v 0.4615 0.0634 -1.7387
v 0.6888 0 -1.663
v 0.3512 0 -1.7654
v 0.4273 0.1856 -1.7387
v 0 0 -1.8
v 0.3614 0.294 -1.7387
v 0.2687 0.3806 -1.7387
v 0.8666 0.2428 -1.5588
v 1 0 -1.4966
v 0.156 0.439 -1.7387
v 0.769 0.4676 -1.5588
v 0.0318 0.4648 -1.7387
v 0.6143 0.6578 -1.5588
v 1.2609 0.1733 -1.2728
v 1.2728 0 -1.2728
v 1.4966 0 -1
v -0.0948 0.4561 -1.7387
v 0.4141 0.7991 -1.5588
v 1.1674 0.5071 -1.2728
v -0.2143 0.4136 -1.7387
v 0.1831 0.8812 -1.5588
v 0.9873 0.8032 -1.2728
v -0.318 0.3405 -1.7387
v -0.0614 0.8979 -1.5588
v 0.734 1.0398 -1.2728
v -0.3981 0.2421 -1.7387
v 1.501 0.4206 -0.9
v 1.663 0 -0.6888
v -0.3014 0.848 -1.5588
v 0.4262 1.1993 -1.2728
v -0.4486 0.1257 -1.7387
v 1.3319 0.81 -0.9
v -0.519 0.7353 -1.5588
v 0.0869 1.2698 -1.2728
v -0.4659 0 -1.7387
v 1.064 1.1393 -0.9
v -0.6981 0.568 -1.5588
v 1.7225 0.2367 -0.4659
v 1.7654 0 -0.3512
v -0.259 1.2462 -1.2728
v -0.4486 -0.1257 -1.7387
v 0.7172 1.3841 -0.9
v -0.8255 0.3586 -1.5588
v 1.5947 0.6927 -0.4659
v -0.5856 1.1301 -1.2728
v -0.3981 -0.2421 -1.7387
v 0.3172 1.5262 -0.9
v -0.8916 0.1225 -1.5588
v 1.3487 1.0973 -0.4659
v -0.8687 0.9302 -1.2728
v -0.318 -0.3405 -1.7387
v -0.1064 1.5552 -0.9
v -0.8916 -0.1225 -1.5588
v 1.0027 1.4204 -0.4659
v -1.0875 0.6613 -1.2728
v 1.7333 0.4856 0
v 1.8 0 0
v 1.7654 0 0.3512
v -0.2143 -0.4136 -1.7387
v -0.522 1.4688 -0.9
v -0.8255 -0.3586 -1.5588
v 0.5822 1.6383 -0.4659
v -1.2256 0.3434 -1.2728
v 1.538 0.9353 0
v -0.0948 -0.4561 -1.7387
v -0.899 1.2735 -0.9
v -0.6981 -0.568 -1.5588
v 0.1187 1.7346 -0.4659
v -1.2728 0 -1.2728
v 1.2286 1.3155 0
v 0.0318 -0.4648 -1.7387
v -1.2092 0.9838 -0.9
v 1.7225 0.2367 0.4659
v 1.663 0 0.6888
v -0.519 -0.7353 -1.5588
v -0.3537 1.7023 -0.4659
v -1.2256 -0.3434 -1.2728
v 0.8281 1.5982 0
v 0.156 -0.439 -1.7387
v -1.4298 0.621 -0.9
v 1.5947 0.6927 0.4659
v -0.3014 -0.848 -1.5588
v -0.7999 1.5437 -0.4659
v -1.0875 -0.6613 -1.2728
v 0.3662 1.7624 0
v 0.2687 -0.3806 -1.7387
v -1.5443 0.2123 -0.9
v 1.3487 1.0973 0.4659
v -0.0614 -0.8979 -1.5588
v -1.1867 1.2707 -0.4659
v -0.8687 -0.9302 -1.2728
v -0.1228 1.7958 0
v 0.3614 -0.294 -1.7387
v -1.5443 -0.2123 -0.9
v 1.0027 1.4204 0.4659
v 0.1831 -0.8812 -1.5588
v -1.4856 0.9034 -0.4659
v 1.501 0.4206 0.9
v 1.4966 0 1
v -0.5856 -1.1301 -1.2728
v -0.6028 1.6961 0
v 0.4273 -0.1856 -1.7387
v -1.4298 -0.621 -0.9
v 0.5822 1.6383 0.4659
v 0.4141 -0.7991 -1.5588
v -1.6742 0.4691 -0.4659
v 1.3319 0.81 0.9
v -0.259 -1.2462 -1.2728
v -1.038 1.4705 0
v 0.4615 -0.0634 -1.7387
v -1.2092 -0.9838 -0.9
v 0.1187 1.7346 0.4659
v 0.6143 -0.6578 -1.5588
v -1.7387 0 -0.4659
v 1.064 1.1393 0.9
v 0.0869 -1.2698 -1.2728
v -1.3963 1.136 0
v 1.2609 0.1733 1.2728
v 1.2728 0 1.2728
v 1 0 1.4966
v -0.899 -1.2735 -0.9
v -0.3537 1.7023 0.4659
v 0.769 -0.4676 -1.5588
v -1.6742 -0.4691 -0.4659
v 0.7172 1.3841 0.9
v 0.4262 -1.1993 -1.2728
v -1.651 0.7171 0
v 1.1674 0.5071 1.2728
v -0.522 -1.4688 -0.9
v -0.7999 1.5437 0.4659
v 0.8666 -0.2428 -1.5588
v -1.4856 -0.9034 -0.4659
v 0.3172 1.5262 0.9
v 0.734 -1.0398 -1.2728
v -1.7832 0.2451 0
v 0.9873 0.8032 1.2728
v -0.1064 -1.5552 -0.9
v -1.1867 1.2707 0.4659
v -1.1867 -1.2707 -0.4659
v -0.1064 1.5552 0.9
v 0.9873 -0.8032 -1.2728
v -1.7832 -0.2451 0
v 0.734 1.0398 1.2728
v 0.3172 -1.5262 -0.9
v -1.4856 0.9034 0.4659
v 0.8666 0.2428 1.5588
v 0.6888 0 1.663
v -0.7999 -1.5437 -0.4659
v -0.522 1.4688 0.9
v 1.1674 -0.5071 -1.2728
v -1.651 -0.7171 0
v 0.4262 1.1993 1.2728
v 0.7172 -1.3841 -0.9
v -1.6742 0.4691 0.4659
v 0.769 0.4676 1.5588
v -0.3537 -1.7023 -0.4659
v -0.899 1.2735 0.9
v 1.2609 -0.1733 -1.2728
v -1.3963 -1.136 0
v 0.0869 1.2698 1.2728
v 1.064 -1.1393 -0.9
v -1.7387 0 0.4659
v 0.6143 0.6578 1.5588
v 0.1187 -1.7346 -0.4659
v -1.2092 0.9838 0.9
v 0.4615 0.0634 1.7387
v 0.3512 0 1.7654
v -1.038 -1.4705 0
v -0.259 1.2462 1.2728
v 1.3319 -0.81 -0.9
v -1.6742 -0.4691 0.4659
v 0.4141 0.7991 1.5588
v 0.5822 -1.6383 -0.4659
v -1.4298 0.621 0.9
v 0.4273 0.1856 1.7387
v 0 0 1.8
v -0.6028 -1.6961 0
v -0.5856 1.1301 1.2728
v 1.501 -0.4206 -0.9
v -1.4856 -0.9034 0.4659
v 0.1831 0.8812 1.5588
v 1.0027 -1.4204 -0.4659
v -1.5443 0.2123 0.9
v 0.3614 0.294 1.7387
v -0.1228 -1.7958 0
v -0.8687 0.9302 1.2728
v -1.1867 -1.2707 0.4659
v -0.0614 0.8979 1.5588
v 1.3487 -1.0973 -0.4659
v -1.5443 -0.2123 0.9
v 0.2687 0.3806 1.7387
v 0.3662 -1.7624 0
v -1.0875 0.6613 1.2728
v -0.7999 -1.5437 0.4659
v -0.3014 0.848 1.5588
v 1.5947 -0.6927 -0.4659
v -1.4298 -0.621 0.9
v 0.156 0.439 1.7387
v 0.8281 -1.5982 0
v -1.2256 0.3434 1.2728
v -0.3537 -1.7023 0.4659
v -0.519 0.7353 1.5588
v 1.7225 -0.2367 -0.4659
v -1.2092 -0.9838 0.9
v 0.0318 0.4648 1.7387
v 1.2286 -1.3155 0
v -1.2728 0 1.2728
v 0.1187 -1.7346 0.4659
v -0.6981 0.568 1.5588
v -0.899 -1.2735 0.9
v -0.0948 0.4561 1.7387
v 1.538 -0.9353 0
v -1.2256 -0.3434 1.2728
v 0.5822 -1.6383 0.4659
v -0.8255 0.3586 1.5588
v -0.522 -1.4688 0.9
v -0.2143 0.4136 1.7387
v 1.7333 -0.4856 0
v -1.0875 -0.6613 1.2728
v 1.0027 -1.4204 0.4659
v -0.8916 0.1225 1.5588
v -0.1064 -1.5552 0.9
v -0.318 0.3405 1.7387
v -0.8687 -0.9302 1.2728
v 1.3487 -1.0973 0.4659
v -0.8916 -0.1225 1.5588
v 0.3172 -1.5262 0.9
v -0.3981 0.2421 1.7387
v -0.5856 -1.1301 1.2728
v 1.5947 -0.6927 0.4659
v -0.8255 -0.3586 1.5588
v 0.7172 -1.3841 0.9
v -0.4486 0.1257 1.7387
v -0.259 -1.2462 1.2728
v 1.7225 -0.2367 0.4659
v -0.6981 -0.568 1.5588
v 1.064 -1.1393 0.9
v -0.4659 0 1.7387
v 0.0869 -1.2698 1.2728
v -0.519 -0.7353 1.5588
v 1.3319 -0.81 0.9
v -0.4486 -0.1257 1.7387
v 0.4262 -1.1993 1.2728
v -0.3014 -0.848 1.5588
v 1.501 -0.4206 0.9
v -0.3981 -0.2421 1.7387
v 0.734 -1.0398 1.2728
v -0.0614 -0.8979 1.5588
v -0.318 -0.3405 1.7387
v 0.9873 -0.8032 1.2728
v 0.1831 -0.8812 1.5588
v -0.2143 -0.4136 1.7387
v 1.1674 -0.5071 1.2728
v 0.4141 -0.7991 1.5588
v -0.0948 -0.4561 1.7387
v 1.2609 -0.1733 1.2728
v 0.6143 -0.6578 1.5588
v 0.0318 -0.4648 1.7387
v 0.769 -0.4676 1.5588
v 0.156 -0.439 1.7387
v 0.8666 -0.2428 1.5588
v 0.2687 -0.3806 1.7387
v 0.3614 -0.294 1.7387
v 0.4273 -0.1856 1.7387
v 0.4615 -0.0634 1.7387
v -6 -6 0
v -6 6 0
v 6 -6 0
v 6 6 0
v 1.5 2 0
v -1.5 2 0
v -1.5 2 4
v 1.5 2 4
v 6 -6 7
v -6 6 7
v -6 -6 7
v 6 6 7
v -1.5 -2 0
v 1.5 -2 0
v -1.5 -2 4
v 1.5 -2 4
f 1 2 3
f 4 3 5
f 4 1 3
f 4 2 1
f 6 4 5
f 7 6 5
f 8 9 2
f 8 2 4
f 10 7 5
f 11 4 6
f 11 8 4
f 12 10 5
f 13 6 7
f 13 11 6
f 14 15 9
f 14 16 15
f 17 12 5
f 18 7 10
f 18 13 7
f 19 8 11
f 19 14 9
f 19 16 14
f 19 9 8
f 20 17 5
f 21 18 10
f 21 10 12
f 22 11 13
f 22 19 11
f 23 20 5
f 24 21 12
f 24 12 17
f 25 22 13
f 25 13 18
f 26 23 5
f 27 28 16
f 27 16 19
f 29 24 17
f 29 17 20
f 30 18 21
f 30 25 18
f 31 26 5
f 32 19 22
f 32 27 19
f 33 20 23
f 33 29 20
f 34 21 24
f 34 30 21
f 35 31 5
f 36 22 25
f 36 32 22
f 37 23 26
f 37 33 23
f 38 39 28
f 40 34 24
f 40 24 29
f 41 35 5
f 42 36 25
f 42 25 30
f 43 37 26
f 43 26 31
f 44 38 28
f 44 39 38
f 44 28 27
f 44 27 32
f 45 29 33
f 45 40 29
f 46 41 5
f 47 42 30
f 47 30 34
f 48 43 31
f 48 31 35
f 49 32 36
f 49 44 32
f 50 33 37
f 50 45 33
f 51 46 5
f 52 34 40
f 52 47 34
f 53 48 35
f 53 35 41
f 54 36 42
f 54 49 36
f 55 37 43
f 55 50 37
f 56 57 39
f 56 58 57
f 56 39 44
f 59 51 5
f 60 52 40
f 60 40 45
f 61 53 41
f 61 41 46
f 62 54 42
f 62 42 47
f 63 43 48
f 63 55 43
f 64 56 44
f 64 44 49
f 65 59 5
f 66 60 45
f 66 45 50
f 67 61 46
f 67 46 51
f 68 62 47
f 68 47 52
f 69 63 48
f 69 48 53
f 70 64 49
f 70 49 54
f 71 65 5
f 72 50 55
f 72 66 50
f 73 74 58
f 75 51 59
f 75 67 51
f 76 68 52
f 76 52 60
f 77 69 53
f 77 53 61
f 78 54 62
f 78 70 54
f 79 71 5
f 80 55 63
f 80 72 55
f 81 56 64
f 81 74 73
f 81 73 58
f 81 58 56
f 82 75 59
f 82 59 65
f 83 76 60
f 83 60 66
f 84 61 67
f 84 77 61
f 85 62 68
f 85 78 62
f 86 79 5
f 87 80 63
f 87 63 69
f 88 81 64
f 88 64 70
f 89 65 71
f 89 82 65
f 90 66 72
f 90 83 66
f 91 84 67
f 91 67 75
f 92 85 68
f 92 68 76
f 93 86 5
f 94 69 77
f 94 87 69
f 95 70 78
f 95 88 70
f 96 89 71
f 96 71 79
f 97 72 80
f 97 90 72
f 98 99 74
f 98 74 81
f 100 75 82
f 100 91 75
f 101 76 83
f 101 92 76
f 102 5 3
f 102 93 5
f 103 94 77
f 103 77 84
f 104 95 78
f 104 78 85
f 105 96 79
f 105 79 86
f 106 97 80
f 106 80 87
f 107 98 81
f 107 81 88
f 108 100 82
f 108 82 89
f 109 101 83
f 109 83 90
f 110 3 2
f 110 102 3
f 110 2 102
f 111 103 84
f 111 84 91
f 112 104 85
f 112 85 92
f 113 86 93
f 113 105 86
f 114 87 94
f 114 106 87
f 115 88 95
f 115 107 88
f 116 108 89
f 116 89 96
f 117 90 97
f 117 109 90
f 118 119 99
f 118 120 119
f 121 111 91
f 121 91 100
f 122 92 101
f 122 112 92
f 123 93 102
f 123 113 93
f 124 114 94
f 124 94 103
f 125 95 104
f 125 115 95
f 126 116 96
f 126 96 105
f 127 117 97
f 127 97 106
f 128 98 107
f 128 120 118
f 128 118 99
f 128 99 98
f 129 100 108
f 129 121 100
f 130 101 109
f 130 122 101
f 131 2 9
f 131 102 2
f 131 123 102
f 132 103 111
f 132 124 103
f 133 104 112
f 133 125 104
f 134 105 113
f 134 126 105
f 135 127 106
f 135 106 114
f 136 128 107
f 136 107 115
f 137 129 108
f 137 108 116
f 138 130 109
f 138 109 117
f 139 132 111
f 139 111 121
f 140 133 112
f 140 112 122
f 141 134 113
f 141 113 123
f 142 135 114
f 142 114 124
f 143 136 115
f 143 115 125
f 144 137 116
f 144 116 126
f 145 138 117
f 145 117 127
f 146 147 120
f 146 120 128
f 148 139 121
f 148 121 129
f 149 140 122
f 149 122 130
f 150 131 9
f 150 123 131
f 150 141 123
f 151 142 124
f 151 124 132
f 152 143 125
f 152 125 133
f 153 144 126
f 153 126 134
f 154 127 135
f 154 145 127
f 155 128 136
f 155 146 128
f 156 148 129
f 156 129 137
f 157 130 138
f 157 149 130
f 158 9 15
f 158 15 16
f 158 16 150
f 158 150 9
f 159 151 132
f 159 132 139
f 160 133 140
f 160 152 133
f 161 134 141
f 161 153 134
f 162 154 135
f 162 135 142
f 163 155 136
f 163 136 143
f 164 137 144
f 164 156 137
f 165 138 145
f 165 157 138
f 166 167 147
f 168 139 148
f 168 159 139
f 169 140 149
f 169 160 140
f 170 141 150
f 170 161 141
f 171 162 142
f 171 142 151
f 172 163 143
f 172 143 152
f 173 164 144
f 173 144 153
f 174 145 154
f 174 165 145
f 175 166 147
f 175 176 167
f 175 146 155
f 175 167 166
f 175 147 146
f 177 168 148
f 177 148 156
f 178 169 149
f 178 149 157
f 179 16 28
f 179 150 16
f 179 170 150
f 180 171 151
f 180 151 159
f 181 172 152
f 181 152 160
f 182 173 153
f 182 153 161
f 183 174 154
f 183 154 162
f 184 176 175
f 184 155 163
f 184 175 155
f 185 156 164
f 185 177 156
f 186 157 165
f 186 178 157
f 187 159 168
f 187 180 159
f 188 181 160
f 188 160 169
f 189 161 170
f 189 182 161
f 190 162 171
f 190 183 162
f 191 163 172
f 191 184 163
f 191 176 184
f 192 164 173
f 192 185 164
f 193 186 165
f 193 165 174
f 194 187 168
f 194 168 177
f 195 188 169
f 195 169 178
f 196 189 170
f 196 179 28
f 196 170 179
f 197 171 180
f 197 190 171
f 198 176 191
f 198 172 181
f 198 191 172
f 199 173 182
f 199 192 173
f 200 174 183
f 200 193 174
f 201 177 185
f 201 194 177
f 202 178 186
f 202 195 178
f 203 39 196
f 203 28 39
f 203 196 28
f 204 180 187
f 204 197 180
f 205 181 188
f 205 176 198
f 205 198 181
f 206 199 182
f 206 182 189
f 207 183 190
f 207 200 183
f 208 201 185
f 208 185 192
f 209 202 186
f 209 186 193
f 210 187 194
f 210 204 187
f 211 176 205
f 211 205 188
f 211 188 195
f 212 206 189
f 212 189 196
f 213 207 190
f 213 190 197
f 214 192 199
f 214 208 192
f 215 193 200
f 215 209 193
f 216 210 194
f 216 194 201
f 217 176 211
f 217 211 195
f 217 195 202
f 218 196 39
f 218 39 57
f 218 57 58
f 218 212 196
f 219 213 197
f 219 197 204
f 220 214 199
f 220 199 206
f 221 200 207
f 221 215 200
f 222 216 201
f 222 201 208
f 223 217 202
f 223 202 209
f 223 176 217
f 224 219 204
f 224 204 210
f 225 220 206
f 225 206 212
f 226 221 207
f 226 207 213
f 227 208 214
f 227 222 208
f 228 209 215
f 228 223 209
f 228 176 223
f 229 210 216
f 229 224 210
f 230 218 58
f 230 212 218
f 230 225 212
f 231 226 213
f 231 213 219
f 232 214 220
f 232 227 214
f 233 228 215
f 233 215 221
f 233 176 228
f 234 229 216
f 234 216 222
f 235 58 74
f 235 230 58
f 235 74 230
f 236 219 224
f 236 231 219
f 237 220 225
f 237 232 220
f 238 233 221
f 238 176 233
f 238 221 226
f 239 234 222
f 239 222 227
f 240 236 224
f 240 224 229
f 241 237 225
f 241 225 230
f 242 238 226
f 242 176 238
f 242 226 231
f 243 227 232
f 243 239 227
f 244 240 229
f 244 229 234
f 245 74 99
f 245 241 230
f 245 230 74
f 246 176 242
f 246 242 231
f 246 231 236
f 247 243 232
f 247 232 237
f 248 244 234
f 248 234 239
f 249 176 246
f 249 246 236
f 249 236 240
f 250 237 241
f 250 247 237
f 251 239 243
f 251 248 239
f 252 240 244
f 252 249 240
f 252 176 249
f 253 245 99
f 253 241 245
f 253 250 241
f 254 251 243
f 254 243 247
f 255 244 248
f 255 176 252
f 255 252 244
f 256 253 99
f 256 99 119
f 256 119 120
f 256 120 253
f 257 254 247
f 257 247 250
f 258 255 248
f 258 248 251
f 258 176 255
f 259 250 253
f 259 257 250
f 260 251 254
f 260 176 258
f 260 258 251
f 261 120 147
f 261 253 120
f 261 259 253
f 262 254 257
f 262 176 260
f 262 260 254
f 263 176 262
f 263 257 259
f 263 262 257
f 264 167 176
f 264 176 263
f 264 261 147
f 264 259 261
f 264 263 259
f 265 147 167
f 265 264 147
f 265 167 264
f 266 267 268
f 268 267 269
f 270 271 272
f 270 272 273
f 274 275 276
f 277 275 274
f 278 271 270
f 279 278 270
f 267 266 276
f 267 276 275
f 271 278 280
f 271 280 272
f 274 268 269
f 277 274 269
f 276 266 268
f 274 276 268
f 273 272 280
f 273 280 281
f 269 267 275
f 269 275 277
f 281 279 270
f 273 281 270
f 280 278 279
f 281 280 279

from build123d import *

# Parameters (mm, degrees)
BOX_W        = 3
BOX_H        = 4
BOX_DEPTH    = 4
BOX001_W     = 12
BOX001_H     = 12
BOX001_DEPTH = 7


with BuildPart() as cube:
    # Box → Box (new body)
    with BuildSketch(Plane(origin=(-1.5, -2, 0), x_dir=(1, 0, 0), z_dir=(0, 0, 1))):
        with Locations((1.5, 2)):
            Rectangle(BOX_W, BOX_H)
    extrude(amount=BOX_DEPTH)


with BuildPart() as sphere:
    # Sphere → Sphere (revolve)
    with BuildSketch(Plane.XZ):
        with BuildLine():
            ThreePointArc((0, -1.8), (1.8, 0), (0, 1.8))
            Line((0, 1.8), (0, -1.8))
        make_face()
    revolve(axis=Axis((0, 0, 0), (0, 0, 1)))


with BuildPart() as cube001:
    # Box001 → Box001 (new body)
    with BuildSketch(Plane(origin=(-6, -6, 0), x_dir=(1, 0, 0), z_dir=(0, 0, 1))):
        with Locations((6, 6)):
            Rectangle(BOX001_W, BOX001_H)
    extrude(amount=BOX001_DEPTH)


solid = Compound([cube.part, sphere.part, cube001.part])
